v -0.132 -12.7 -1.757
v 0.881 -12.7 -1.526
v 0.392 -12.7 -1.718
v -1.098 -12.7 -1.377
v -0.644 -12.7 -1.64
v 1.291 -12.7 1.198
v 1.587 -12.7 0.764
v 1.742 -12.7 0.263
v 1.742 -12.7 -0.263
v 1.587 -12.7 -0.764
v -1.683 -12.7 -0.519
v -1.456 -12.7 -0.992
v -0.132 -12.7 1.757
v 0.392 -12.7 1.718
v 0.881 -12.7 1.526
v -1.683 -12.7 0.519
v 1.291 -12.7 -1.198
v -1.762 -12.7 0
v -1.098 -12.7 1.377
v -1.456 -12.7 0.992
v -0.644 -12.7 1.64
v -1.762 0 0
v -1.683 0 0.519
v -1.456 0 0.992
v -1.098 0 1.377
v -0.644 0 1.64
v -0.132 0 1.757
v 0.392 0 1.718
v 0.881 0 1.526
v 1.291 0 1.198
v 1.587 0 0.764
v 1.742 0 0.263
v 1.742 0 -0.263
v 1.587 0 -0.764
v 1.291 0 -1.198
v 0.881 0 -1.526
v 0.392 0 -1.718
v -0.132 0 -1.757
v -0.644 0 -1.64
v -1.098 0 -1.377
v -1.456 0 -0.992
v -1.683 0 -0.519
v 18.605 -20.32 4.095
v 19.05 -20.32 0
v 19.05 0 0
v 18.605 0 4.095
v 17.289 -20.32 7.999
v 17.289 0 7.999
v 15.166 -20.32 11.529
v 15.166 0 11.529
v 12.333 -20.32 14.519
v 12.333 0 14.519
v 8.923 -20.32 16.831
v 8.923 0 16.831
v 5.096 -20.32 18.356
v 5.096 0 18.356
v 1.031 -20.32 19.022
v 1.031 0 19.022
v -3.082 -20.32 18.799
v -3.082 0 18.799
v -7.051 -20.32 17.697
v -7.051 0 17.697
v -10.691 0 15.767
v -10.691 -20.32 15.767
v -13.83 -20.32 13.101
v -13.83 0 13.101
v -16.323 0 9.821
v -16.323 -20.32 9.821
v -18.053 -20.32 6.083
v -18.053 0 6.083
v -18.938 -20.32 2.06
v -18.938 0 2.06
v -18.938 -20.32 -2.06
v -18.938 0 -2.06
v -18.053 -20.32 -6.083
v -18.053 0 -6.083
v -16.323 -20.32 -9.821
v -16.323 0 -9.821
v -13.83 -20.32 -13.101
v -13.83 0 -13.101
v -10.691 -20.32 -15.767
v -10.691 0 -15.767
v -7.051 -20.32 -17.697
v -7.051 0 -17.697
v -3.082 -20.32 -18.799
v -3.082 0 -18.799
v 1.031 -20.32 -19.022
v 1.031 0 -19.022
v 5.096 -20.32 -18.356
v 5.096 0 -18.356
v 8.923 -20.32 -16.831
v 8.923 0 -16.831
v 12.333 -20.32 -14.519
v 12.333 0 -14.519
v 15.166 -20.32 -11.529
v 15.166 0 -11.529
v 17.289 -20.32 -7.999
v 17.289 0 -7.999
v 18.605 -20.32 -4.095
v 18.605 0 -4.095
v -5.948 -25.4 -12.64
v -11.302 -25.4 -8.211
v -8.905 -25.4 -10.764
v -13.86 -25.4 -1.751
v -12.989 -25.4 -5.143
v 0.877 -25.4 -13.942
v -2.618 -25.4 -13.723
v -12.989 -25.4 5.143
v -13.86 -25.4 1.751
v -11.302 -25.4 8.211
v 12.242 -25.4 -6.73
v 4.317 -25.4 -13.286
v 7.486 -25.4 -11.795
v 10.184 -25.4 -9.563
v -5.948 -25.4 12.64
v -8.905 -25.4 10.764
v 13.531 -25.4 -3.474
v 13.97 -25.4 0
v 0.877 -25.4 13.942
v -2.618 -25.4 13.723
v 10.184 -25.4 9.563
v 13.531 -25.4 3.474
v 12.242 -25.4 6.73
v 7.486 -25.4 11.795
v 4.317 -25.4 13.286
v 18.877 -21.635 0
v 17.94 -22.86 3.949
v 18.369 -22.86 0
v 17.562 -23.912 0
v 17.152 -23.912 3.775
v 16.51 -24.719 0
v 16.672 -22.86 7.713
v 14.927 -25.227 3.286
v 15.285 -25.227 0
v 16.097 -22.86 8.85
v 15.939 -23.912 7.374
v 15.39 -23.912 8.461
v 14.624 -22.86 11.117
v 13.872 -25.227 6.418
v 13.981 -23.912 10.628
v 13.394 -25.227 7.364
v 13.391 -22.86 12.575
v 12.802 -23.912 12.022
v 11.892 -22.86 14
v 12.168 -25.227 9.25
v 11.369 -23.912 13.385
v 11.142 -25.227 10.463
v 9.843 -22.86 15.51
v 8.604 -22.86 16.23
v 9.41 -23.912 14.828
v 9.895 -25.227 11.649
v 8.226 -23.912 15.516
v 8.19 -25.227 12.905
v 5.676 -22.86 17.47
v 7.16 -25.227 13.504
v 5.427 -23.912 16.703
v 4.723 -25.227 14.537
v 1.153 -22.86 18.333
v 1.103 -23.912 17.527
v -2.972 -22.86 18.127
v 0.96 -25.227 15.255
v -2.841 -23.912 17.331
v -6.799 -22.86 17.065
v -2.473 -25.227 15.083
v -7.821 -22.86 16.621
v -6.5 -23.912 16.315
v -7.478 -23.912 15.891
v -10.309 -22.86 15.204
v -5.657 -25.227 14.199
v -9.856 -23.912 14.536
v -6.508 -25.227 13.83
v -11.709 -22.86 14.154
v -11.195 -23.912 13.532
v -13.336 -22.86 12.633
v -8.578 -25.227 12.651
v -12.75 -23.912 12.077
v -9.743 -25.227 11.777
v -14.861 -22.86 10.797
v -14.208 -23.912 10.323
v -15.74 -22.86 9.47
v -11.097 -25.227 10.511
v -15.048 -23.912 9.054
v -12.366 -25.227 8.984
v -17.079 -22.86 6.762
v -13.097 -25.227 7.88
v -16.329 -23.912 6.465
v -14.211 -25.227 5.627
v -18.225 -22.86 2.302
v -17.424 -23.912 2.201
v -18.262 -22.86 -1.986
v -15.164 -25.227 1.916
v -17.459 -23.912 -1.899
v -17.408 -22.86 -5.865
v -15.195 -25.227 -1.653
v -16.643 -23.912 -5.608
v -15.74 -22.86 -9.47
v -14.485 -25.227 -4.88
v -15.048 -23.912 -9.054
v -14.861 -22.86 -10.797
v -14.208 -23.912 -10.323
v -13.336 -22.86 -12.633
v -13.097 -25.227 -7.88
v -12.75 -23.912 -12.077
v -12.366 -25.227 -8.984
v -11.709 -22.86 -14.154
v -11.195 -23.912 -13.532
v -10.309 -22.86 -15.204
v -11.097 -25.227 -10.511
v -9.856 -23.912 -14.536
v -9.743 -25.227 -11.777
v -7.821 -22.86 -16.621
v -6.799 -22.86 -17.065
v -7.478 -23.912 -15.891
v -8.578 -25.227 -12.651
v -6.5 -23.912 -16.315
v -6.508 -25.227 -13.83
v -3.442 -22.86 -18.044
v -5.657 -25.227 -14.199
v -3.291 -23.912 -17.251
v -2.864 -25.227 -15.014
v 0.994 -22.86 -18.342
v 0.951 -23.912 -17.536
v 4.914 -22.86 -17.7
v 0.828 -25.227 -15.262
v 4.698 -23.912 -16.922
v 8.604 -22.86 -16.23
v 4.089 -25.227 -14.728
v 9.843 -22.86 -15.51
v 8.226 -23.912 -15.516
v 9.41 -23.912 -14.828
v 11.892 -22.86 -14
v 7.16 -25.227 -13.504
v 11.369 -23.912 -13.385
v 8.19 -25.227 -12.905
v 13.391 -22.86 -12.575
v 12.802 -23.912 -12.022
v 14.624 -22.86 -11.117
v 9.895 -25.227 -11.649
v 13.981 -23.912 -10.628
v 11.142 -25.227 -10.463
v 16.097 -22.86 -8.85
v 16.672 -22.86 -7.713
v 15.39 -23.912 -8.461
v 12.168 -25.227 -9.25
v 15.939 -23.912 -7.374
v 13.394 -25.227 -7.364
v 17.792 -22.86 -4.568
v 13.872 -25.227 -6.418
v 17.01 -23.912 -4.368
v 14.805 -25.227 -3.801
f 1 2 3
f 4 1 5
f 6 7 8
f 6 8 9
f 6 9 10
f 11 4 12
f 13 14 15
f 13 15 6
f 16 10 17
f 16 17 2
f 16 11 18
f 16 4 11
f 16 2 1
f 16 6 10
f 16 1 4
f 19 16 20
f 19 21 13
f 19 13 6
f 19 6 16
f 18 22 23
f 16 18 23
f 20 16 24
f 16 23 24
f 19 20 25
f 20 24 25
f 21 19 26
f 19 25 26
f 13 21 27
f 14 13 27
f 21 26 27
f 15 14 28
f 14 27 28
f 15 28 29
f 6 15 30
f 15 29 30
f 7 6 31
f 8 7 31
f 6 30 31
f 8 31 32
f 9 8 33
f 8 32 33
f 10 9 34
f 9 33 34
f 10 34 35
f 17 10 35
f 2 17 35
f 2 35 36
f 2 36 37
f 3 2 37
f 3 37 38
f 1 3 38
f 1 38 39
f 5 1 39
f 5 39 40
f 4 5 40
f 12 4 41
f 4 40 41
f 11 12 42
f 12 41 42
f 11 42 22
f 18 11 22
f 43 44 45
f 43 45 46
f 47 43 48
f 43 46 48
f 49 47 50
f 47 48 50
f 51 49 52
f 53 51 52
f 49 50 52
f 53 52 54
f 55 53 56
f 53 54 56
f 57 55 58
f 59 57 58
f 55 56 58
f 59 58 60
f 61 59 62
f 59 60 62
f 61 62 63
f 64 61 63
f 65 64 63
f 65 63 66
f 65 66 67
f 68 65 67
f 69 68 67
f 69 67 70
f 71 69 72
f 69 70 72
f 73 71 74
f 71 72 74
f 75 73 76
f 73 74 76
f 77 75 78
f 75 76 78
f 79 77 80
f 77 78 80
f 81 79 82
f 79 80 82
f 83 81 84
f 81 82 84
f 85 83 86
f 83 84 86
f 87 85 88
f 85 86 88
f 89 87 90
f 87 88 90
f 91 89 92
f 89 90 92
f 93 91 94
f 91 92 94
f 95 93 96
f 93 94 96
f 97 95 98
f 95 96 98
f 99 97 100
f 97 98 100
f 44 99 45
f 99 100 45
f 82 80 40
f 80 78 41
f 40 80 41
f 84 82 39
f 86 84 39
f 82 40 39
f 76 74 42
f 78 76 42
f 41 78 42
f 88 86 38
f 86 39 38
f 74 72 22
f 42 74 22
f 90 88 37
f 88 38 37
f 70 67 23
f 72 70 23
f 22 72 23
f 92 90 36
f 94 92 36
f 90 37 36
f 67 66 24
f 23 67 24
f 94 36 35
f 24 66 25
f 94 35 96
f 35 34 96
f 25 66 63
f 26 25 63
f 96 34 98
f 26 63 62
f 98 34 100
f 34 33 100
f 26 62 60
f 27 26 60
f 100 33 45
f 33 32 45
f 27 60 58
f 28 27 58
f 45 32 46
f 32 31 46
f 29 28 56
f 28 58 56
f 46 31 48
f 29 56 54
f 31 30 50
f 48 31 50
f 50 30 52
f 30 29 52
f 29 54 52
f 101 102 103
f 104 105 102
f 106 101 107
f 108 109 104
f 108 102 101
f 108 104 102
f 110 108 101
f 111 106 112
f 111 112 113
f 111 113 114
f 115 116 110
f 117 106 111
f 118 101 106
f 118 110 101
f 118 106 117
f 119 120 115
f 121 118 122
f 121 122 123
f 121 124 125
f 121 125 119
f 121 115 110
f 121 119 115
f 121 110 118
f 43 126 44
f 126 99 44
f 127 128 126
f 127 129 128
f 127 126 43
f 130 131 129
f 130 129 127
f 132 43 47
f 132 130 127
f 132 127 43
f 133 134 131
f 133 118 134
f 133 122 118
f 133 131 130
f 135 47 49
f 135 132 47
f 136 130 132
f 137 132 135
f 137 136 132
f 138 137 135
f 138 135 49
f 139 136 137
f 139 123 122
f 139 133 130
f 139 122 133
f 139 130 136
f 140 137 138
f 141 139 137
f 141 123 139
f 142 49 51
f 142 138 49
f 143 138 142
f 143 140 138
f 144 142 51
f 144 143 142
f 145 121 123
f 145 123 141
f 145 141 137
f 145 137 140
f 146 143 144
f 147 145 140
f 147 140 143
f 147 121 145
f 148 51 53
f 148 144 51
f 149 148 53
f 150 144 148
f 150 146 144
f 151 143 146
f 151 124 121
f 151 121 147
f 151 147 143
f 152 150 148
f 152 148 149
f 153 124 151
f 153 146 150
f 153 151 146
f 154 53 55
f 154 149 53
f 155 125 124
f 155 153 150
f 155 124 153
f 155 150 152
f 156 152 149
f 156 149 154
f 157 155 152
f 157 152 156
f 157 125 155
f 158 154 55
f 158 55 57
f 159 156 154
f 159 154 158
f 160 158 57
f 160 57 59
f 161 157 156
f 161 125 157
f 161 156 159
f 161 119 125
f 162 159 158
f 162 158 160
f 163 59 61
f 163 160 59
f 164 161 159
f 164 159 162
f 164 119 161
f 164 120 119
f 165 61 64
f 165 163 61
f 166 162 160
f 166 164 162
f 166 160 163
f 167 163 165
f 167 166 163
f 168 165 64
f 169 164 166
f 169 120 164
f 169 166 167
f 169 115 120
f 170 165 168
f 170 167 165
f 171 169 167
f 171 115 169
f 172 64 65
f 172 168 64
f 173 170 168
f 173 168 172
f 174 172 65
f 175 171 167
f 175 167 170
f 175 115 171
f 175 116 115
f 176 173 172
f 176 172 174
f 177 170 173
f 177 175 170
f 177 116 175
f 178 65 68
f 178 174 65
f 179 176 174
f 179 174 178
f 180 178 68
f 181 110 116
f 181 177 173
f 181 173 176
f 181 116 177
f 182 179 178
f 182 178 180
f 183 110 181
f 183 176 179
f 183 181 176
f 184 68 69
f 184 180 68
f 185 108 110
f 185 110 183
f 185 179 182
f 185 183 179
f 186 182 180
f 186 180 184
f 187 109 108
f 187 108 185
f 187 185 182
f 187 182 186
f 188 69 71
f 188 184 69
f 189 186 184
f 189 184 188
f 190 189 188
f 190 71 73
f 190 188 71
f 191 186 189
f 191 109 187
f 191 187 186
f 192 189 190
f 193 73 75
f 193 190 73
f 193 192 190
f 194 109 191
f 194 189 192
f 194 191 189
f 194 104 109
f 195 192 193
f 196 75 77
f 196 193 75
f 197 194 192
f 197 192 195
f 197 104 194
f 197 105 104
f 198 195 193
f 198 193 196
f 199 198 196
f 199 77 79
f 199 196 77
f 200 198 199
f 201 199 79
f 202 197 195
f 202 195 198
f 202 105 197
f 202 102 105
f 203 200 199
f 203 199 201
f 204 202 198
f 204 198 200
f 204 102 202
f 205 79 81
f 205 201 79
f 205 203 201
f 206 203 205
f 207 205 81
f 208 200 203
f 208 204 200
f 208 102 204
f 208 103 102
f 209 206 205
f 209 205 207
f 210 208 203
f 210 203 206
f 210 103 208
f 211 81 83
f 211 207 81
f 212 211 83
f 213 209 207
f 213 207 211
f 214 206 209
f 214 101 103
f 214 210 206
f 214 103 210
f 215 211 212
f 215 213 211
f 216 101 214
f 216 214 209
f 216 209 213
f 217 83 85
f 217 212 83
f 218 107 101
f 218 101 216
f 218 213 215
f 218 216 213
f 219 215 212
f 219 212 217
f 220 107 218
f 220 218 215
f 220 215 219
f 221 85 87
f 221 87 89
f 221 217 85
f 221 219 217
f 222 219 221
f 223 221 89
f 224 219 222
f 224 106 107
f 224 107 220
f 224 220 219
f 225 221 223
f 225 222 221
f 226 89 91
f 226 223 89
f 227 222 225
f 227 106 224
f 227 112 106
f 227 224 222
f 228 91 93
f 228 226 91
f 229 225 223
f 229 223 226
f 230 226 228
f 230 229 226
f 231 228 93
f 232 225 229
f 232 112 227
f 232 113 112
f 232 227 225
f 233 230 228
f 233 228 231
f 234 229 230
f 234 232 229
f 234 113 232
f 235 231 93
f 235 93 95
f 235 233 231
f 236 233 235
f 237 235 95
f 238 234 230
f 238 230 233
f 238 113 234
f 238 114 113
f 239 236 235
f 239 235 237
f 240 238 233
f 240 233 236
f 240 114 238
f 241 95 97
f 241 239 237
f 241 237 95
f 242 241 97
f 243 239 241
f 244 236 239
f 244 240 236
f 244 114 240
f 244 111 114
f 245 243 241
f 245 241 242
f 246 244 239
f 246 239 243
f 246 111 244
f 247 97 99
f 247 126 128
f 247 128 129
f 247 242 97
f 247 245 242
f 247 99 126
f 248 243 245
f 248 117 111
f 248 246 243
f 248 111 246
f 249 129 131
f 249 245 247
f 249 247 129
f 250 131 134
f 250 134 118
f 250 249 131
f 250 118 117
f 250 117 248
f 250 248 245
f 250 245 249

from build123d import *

# Parameters (mm, degrees)
F0_R     = 19.05
F1_DEPTH = 25.4
F2_R     = 21.73222
F2_R_2   = 19.05
F3_DEPTH = 19.05
F4_R     = 5.08
F5_R     = 1.761688
F6_DEPTH = 12.7


with BuildPart() as f1:
    # F0 (on Front) → F1 (new body)
    with BuildSketch(Plane.XZ):
        Circle(F0_R)
    extrude(amount=F1_DEPTH)

    # F2 (on face) → F3 (cut)
    with BuildSketch(Plane.XZ.offset(25.4)):
        Circle(F2_R)
        Circle(F2_R_2, mode=Mode.SUBTRACT)
    extrude(amount=-F3_DEPTH, mode=Mode.SUBTRACT)

    # F4
    f4_edges = [f1.edges().sort_by_distance(p)[0] for p in [
        (-19.05, -25.4, 0),
    ]]
    fillet(f4_edges, radius=F4_R)

    # F5 (on face) → F6 (cut)
    with BuildSketch(Plane(origin=(0, 0, 0), x_dir=(-1, 0, 0), z_dir=(0, 1, 0))):
        Circle(F5_R)
    extrude(amount=-F6_DEPTH, mode=Mode.SUBTRACT)


solid = f1.part
